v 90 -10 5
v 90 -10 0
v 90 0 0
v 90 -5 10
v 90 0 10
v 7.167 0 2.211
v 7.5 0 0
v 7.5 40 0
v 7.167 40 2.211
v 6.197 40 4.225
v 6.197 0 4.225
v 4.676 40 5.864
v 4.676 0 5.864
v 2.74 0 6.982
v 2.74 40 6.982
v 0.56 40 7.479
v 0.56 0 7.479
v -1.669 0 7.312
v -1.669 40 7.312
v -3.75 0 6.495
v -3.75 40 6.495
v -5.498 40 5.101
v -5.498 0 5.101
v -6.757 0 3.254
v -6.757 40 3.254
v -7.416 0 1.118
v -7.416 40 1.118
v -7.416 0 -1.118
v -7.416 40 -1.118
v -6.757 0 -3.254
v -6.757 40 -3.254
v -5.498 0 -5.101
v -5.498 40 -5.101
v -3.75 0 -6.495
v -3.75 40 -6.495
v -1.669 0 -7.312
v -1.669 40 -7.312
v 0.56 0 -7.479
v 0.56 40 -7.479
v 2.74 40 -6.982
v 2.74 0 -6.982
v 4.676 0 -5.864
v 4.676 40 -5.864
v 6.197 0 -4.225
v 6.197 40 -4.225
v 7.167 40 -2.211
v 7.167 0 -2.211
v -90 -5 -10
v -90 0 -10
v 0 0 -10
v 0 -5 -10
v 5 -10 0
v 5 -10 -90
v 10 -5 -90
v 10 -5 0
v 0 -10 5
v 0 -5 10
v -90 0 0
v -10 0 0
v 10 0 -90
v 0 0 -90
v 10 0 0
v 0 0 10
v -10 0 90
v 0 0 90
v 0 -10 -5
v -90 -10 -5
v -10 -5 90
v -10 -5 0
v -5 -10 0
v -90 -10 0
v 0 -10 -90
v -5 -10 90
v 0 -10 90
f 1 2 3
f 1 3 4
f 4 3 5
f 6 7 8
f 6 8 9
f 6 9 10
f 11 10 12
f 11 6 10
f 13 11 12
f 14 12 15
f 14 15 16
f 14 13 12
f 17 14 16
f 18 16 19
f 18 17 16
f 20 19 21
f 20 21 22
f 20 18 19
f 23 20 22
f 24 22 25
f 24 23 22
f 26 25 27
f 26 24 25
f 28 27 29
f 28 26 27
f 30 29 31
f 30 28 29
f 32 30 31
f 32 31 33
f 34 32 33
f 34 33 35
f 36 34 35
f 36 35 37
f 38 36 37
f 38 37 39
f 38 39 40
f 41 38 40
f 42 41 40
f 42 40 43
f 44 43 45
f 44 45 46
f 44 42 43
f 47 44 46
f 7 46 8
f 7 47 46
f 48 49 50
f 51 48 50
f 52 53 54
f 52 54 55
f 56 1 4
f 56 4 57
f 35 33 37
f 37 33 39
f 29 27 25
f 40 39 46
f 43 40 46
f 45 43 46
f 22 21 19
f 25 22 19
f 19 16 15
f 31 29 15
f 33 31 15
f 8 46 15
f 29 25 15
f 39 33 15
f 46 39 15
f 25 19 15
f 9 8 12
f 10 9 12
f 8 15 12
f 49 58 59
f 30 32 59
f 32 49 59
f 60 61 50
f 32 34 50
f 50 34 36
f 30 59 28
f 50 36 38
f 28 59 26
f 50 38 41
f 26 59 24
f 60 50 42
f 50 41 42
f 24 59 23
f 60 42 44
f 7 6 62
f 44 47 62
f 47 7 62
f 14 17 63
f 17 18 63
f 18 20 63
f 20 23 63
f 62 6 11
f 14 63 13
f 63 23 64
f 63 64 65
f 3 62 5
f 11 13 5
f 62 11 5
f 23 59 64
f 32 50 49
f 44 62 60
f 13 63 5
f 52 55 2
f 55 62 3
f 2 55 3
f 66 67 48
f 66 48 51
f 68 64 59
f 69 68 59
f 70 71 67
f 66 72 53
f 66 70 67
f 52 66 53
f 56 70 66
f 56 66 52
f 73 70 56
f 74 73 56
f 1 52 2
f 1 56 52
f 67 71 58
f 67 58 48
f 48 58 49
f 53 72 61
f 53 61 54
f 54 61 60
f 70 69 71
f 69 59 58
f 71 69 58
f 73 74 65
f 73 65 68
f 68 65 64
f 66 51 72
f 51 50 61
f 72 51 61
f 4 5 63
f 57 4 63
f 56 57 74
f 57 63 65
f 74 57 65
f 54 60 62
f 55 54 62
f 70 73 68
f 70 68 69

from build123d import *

# Parameters (mm, degrees)
F1_DEPTH = 10
F2_SIZE  = 5
F3_R     = 7.5
F4_DEPTH = 40


with BuildPart() as f1:
    # F0 (on Front) → F1 (new body)
    with BuildSketch(Plane.XZ):
        with BuildLine():
            ThreePointArc((-10, 0), (-7.0710678119, 7.0710678119), (0, 10))
            Line((0, 10), (0, 90))
            Line((0, 90), (-10, 90))
            Line((-10, 90), (-10, 0))
        make_face()
        with BuildLine():
            ThreePointArc((0, -10), (-7.0710678119, -7.0710678119), (-10, 0))
            Line((-10, 0), (-90, 0))
            Line((-90, 0), (-90, -10))
            Line((-90, -10), (0, -10))
        make_face()
        with BuildLine():
            Line((10, -90), (10, 0))
            ThreePointArc((10, 0), (7.0710678119, -7.0710678119), (0, -10))
            Line((0, -10), (0, -90))
            Line((0, -90), (10, -90))
        make_face()
        with BuildLine():
            Line((0, 10), (0, 0))
            Line((0, 0), (10, 0))
            ThreePointArc((10, 0), (7.0710678119, 7.0710678119), (0, 10))
        make_face()
        with BuildLine():
            Line((10, 0), (0, 0))
            Line((0, 0), (0, -10))
            ThreePointArc((0, -10), (7.0710678119, -7.0710678119), (10, 0))
        make_face()
        with BuildLine():
            Line((-10, 0), (0, 0))
            Line((0, 0), (0, 10))
            ThreePointArc((0, 10), (-7.0710678119, 7.0710678119), (-10, 0))
        make_face()
        with BuildLine():
            Line((0, -10), (0, 0))
            Line((0, 0), (-10, 0))
            ThreePointArc((-10, 0), (-7.0710678119, -7.0710678119), (0, -10))
        make_face()
        with BuildLine():
            ThreePointArc((0, 10), (7.0710678119, 7.0710678119), (10, 0))
            Line((10, 0), (90, 0))
            Line((90, 0), (90, 10))
            Line((90, 10), (0, 10))
        make_face()
    extrude(amount=F1_DEPTH)

    # F2
    f2_edges = [f1.edges().sort_by_distance(p)[0] for p in [
        (-10, -10, 45),
        (-45, -10, -10),
        (10, -10, -45),
        (45, -10, 10),
    ]]
    chamfer(f2_edges, length=F2_SIZE)

    # F3 (on Front) → F4 (join)
    with BuildSketch(Plane.XZ):
        Circle(F3_R)
    extrude(amount=-F4_DEPTH)


solid = f1.part
